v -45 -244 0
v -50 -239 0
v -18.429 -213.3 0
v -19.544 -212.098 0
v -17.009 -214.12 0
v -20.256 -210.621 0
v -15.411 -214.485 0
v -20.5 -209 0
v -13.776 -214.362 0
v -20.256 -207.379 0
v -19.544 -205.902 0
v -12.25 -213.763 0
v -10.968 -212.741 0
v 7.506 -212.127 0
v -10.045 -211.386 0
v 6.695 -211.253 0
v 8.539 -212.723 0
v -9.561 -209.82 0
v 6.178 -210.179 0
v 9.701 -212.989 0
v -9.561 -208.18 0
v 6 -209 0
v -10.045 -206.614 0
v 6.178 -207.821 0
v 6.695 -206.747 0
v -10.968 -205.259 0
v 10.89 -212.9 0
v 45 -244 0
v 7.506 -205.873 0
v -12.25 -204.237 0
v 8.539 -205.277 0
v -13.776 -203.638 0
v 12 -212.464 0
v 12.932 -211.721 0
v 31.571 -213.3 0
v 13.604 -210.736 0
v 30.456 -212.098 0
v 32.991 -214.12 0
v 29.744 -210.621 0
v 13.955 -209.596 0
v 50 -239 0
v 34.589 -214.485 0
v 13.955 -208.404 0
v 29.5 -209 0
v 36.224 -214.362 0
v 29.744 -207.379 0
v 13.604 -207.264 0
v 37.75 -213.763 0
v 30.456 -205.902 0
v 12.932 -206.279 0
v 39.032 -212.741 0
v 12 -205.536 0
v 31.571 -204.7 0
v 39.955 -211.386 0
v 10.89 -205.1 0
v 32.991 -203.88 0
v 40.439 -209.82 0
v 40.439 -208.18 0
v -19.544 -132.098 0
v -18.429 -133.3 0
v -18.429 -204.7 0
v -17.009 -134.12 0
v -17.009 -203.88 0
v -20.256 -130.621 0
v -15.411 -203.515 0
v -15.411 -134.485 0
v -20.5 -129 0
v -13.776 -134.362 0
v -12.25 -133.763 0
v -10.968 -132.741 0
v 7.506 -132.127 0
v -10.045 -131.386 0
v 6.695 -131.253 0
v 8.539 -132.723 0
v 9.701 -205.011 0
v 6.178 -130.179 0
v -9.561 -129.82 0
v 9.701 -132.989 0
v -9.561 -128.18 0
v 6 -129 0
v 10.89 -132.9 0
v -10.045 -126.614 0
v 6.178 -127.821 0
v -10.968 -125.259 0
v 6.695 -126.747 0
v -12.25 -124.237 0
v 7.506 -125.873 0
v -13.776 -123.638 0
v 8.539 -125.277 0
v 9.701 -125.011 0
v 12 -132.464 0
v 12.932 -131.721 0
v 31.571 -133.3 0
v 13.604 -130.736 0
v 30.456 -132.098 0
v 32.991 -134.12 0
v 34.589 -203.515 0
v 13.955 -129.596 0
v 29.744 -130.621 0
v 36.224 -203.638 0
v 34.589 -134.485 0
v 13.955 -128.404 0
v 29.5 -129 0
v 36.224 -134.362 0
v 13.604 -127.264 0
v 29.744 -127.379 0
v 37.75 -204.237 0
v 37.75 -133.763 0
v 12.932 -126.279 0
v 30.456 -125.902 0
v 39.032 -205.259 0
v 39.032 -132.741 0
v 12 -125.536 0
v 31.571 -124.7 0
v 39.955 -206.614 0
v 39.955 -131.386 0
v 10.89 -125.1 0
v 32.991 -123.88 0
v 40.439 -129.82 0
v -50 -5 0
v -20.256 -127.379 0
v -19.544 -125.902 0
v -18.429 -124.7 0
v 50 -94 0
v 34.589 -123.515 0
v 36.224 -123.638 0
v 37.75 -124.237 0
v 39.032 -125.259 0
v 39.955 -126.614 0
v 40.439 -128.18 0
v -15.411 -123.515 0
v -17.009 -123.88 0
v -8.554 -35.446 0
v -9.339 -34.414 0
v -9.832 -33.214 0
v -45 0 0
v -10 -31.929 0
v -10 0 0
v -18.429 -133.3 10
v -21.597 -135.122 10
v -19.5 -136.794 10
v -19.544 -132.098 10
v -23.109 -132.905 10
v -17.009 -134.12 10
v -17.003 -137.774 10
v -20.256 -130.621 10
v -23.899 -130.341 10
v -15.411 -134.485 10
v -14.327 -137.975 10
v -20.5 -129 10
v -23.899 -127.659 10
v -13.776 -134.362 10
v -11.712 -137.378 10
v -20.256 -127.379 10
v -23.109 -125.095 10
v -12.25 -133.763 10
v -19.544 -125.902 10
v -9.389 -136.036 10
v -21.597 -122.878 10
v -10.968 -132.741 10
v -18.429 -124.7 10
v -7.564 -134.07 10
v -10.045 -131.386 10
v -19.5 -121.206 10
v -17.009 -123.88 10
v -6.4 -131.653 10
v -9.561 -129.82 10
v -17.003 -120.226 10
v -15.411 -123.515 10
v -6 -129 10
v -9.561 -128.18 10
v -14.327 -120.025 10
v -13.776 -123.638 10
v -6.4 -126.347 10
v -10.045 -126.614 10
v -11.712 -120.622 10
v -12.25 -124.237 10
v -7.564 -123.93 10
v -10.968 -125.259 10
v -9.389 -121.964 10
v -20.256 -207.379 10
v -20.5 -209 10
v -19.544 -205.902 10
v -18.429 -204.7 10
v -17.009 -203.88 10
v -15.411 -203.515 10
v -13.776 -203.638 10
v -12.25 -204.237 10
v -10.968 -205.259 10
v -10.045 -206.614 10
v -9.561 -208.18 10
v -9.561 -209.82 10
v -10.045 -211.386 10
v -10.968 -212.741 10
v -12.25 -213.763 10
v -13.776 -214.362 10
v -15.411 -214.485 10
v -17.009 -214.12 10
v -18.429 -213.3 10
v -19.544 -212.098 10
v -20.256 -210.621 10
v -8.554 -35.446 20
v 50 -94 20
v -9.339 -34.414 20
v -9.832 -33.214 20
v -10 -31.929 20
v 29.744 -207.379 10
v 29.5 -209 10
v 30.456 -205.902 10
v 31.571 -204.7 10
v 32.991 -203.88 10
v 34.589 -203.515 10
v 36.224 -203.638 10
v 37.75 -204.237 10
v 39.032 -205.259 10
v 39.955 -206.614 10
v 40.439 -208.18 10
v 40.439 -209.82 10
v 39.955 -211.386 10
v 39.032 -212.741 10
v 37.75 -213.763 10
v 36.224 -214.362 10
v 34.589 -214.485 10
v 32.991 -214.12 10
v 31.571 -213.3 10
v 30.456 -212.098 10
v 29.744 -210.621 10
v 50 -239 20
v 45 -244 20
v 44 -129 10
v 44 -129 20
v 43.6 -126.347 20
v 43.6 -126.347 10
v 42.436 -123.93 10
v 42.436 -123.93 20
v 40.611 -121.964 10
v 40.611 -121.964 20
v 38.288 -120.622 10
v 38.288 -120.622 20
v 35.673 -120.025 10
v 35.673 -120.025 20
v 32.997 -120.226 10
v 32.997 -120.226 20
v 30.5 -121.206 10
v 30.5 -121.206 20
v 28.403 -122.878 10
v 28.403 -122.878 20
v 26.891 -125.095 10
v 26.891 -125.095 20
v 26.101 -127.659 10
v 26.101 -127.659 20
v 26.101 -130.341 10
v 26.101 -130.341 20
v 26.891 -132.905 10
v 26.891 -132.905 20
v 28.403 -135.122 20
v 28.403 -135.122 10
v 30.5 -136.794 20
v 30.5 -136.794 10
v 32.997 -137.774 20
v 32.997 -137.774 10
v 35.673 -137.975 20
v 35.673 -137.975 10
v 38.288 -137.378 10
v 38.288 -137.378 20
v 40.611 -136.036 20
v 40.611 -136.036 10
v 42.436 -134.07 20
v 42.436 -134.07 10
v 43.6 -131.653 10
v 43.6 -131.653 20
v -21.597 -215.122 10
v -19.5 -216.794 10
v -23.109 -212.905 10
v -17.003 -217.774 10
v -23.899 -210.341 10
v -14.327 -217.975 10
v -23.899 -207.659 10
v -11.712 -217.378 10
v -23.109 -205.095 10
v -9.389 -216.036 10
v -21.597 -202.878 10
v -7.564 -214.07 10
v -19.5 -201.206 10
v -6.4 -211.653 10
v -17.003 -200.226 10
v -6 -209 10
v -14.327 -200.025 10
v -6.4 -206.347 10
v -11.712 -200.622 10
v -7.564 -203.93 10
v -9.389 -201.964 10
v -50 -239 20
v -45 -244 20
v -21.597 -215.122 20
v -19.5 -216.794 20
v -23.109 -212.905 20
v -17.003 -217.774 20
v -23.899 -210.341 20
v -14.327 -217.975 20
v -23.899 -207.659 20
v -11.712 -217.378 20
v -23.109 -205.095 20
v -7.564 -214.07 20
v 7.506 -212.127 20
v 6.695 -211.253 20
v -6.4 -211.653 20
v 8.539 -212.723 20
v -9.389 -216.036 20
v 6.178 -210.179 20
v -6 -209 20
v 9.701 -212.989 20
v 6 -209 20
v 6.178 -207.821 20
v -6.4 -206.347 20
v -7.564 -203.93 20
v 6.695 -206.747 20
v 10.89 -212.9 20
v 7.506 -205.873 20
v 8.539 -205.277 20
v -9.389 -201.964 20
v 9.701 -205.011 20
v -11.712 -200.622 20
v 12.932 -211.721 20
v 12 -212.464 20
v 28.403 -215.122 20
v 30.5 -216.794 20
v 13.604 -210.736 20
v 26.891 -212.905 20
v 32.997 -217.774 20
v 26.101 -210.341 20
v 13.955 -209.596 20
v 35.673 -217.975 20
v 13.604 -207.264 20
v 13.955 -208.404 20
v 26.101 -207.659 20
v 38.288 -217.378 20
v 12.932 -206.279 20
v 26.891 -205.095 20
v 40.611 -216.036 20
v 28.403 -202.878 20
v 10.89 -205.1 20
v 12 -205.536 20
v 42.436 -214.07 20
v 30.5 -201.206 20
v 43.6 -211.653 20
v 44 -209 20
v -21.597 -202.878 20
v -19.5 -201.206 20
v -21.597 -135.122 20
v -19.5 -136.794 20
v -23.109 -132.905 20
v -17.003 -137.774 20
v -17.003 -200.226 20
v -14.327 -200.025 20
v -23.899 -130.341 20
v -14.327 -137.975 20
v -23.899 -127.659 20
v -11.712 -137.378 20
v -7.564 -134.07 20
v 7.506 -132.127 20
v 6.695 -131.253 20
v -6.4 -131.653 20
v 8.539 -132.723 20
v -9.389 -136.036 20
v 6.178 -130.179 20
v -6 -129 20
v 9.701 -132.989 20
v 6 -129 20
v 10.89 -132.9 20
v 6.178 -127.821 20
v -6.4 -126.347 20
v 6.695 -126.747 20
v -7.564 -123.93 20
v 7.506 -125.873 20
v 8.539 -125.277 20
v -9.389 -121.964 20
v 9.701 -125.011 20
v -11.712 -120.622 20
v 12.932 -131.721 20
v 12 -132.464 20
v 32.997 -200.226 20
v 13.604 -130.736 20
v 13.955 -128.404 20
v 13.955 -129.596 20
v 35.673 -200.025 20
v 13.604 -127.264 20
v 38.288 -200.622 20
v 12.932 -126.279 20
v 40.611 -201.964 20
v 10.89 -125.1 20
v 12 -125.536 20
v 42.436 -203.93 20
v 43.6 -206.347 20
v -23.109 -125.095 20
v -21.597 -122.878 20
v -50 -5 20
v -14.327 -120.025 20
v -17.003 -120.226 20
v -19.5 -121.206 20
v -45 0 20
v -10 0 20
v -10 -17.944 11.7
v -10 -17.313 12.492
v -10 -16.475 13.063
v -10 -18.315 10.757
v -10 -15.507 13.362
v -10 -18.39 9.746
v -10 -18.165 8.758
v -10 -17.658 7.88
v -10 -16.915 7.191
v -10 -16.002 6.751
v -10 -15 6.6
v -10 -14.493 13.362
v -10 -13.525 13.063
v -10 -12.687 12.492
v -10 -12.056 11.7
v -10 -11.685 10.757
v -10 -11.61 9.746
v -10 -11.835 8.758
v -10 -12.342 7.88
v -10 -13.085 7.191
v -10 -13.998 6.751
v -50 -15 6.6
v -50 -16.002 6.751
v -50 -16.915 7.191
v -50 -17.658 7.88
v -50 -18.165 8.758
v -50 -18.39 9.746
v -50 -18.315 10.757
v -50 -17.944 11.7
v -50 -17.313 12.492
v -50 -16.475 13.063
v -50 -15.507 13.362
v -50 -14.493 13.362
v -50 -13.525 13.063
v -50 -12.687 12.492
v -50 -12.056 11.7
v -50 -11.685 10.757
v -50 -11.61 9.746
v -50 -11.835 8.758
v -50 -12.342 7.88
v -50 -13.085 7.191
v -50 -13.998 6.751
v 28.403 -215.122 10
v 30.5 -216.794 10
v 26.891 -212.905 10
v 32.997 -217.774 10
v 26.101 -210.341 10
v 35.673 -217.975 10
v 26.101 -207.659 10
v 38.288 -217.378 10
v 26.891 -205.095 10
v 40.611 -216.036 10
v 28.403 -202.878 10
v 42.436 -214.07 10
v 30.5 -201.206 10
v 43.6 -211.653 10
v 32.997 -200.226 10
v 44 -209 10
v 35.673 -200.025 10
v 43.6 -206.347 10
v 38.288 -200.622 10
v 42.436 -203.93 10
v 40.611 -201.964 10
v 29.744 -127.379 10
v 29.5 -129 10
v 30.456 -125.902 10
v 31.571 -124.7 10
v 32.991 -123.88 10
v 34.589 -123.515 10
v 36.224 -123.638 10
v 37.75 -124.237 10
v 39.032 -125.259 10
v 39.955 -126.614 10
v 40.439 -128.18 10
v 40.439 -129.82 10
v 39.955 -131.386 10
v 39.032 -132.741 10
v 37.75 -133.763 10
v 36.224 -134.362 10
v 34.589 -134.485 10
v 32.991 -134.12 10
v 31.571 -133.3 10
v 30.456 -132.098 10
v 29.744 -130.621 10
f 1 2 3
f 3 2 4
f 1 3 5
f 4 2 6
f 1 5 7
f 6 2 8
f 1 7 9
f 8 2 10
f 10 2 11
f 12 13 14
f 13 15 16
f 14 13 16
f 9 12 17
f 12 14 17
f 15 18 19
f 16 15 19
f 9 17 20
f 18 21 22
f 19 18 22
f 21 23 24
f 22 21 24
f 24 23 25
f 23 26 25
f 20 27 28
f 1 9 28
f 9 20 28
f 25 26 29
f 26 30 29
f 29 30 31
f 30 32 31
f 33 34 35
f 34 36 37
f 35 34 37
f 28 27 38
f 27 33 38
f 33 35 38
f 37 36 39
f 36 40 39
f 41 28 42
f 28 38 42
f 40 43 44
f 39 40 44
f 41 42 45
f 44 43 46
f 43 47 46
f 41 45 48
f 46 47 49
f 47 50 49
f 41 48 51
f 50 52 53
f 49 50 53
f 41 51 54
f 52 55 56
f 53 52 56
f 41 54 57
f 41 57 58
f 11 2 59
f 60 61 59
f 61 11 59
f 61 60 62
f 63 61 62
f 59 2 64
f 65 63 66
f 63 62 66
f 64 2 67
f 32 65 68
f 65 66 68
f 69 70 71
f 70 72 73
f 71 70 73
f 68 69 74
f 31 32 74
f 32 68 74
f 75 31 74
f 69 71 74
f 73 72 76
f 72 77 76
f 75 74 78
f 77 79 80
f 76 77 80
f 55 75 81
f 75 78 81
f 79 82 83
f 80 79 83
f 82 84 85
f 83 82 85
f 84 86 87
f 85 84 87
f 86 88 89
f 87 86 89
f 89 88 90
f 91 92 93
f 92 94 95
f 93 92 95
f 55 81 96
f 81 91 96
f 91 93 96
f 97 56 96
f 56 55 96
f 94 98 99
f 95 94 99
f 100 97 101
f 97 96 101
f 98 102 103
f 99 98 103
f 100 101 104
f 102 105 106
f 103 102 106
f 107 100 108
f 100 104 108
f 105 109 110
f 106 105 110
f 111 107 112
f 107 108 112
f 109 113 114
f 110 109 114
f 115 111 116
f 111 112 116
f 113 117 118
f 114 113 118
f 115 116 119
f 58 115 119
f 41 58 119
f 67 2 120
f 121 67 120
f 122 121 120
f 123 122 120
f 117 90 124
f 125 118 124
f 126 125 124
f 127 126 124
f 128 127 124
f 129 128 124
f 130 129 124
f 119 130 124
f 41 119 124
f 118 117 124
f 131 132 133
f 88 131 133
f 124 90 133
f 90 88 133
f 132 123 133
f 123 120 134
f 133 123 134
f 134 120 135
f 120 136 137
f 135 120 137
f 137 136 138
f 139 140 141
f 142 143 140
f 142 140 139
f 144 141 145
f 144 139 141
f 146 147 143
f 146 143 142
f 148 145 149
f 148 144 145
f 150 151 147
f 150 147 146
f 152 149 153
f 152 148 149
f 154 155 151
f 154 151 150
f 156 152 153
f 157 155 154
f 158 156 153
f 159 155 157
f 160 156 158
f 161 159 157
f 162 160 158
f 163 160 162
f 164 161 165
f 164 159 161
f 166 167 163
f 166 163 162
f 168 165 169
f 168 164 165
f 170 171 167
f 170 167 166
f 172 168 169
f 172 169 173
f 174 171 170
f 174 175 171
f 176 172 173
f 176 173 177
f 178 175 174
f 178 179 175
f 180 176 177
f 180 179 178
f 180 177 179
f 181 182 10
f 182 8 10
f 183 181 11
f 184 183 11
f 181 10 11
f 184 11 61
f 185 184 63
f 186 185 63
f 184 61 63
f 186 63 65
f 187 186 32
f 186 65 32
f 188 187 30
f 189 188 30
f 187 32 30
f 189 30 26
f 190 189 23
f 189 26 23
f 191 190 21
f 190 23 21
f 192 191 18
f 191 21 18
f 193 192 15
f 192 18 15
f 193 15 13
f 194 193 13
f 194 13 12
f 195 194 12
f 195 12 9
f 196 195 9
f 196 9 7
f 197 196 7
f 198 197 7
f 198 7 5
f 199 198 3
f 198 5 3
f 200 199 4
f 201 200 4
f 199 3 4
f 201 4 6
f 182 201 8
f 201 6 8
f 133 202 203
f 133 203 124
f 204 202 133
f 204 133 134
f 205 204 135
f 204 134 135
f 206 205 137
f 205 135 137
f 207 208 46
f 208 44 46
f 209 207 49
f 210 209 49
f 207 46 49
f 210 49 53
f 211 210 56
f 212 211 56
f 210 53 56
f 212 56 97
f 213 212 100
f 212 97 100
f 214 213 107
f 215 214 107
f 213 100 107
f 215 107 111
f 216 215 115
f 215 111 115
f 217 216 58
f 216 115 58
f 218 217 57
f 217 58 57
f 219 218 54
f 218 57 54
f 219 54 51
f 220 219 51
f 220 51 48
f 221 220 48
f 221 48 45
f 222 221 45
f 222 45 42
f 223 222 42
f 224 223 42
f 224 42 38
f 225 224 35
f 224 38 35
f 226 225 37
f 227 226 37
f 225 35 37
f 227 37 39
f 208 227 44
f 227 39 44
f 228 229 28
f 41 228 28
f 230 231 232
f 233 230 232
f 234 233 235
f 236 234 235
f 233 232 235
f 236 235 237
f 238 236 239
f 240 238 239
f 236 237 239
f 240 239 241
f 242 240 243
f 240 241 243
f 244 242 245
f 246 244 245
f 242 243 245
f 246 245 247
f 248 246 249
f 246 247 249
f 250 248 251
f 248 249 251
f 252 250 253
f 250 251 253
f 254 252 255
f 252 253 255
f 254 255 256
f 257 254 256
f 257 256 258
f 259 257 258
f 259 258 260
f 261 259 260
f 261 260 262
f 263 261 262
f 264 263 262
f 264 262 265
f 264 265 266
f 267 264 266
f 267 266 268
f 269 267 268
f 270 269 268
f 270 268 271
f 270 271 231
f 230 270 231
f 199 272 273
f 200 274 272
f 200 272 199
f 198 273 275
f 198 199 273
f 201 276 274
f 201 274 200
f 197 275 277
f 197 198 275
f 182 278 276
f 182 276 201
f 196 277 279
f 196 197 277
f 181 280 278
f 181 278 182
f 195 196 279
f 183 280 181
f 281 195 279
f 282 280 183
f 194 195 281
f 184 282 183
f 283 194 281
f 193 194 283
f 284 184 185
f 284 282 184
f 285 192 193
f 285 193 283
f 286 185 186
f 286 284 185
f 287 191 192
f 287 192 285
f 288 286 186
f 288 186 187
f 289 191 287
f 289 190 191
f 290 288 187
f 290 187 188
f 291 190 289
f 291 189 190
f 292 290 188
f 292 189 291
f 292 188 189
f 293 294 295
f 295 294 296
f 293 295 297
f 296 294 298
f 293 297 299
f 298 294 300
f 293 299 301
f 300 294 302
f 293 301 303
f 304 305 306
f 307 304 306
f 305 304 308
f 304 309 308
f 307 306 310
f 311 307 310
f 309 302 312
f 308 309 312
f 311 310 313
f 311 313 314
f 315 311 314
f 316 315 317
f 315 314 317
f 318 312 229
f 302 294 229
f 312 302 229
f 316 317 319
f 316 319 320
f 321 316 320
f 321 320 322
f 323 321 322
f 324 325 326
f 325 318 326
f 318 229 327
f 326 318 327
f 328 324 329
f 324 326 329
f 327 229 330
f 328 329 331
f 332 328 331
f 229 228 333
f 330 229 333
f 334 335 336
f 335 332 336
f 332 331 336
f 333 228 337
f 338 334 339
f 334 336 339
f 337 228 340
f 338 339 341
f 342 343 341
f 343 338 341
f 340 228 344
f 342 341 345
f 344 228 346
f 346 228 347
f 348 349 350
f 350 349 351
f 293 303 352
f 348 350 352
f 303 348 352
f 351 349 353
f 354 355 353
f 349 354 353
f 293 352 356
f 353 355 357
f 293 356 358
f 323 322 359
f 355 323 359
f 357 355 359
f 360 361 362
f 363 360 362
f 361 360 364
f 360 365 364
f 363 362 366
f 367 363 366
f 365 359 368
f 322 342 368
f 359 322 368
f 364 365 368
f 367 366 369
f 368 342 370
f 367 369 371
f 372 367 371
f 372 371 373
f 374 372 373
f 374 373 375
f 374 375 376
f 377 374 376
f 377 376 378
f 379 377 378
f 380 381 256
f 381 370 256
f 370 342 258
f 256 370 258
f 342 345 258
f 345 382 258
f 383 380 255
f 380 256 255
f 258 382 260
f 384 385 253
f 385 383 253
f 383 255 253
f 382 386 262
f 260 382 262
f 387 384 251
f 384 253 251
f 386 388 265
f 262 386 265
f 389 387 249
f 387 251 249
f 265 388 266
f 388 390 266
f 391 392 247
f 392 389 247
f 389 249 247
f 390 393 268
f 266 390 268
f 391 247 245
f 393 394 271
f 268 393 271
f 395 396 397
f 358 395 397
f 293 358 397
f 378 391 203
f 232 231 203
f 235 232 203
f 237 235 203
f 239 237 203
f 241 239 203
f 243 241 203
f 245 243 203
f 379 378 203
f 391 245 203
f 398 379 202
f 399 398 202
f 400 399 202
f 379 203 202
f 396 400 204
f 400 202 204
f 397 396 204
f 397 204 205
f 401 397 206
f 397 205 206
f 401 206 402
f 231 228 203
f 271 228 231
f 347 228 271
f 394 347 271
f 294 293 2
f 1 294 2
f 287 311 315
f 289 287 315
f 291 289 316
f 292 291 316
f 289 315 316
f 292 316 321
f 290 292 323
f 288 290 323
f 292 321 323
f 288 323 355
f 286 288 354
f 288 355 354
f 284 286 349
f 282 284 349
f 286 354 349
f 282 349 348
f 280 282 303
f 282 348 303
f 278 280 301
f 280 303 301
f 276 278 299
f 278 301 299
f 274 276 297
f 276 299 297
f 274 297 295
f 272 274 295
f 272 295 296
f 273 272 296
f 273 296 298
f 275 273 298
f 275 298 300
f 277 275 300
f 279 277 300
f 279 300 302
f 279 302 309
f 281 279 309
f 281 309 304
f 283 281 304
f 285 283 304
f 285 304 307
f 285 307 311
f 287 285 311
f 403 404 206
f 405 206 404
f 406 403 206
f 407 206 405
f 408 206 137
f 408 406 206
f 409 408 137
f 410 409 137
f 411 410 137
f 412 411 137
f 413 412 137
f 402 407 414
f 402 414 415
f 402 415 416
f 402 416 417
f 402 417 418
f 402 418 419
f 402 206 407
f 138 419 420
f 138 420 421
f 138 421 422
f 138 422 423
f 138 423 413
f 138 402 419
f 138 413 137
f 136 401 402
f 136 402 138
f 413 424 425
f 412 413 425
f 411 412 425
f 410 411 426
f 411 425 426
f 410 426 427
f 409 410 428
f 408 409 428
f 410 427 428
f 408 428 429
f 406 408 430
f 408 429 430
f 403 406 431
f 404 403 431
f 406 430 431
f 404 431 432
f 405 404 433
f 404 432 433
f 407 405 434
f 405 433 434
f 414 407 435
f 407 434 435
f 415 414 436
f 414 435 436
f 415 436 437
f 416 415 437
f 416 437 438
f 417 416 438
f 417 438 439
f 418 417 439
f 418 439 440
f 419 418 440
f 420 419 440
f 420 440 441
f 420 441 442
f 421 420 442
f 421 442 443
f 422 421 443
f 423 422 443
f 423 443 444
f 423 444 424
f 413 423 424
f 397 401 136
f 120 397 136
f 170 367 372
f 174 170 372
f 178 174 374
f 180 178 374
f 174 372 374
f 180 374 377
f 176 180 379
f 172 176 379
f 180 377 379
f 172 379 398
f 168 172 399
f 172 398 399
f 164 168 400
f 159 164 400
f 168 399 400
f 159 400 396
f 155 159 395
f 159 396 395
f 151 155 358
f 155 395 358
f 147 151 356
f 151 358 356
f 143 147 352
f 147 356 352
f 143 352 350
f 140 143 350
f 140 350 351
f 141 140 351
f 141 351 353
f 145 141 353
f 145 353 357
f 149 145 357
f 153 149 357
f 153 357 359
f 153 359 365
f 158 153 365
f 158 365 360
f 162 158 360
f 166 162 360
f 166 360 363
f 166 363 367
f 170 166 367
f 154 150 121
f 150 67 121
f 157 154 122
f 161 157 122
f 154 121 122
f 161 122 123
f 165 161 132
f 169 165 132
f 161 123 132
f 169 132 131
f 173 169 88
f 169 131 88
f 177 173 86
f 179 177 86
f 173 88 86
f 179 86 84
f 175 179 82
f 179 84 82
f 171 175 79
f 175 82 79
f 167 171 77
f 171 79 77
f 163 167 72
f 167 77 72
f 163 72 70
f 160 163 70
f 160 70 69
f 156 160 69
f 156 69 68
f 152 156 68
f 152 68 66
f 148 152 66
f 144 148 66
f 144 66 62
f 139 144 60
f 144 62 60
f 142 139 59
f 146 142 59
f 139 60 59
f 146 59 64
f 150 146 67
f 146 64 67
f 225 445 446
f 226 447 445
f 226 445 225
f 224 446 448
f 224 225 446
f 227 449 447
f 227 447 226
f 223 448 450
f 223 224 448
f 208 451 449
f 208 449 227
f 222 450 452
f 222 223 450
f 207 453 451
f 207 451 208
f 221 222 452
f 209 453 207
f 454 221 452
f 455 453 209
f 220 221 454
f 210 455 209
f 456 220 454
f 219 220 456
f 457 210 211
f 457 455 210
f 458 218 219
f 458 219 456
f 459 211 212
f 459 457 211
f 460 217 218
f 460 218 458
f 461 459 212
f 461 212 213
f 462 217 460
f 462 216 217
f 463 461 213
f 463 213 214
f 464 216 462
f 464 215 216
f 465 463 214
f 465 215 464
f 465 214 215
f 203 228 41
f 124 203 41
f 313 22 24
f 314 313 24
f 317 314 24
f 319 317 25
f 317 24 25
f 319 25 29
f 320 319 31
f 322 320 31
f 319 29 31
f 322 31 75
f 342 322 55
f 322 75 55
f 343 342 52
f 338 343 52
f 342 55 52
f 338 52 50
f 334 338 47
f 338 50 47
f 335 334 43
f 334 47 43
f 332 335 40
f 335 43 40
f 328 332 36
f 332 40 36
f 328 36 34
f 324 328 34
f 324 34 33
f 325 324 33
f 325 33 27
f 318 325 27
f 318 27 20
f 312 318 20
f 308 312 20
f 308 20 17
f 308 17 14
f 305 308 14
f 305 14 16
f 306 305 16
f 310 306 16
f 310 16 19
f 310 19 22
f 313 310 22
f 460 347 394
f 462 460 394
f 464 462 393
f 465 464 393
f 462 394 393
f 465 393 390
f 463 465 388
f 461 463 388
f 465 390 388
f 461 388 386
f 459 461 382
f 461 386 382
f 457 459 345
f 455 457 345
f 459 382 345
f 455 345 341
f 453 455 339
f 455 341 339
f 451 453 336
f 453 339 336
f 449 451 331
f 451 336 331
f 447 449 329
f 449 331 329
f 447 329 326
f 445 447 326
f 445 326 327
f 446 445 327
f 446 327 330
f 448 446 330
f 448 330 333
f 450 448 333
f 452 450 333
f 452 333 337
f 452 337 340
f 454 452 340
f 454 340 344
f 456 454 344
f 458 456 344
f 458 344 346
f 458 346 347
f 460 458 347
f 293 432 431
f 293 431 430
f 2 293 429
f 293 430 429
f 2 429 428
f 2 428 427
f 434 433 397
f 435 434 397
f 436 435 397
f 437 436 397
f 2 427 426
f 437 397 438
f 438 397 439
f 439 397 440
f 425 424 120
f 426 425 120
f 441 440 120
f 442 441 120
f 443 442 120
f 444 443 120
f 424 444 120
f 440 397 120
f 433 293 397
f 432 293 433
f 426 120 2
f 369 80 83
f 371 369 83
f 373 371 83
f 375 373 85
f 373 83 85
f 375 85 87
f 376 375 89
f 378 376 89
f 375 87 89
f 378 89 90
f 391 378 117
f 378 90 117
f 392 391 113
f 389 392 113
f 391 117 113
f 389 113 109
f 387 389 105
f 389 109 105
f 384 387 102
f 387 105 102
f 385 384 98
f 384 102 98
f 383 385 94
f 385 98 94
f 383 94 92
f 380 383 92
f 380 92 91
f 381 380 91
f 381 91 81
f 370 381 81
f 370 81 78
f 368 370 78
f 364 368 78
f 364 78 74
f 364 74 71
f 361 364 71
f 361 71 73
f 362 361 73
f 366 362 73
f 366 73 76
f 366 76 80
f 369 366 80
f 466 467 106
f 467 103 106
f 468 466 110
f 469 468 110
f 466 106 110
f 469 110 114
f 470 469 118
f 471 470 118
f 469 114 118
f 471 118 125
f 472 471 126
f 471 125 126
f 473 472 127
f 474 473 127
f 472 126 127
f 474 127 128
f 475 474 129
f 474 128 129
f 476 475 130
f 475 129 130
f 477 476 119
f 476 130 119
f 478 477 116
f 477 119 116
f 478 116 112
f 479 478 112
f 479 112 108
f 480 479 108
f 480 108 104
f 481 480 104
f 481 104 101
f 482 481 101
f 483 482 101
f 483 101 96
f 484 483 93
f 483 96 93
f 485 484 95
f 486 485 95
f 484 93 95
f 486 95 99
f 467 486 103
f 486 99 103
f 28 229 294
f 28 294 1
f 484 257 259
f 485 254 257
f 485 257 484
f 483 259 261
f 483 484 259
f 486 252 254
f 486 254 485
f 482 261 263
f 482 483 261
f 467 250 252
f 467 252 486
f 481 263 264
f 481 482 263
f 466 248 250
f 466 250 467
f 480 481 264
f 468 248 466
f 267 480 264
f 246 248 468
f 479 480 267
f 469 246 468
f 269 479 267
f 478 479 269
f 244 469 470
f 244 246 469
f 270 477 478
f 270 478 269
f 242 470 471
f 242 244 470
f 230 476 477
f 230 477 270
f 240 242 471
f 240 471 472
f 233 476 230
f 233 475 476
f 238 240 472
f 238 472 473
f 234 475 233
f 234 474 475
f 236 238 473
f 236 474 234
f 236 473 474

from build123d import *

# Parameters (mm, degrees)
SKETCH_3_W                    = 20
SKETCH_3_H                    = 244
EXTRUDE_1_DEPTH               = 50
SKETCH_4_W                    = 60
SKETCH_4_H                    = 20
CUT_EXTRUDE_1_DEPTH           = 34
HOLE_WIZARD_M8_1_D            = 6.8
CHAMFER_1_SIZE                = 60
CHAMFER_2_SIZE                = 5
HOLE_WIZARD_M10_1_D           = 11
HOLE_WIZARD_M10_1_CBORE_D     = 18
HOLE_WIZARD_M10_1_CBORE_DEPTH = 10
HOLE_WIZARD_8_0_8_1_D         = 8
FILLET_1_DEPTH                = 20


with BuildPart() as part:
    # 草圖3 → 伸長1 (new, symmetric)
    with BuildSketch(Plane(origin=(0, 0, 0), x_dir=(0, 0, -1), z_dir=(1, 0, 0))):
        with Locations((-10, -122)):
            Rectangle(SKETCH_3_W, SKETCH_3_H)
    extrude(amount=EXTRUDE_1_DEPTH, both=True)

    # 草圖4 → 除料-伸長1 (cut)
    with BuildSketch(Plane(origin=(0, 0, 0), x_dir=(1, 0, 0), z_dir=(0, 1, 0))):
        with Locations((20, -10)):
            Rectangle(SKETCH_4_W, SKETCH_4_H)
    extrude(amount=-CUT_EXTRUDE_1_DEPTH, mode=Mode.SUBTRACT)

    # M8 螺紋孔1 (through all)
    with Locations(Plane(origin=(-10, -84.062632567, -21.444178573), x_dir=(0, 0, 1), z_dir=(1, 0, 0))):
        with Locations((31.444178573, -69.062632567)):
            Hole(HOLE_WIZARD_M8_1_D / 2)

    # 導角1
    chamfer_1_edges = [part.edges().sort_by_distance(p)[0] for p in [
        (50, -34, 10),
    ]]
    chamfer(chamfer_1_edges, length=CHAMFER_1_SIZE - 0.0001)  # a hair under: the kernel refuses the full size

    # 導角2
    chamfer_2_edges = [part.edges().sort_by_distance(p)[0] for p in [
        (-50, 0, 10),
        (-50, -244, 10),
        (50, -244, 10),
    ]]
    chamfer(chamfer_2_edges, length=CHAMFER_2_SIZE)

    # M10 六角承窩頭蓋螺釘的柱孔1 (through all)
    with Locations(Plane.XY.offset(20)):
        with Locations((-15, -129), (35, -129), (-15, -209), (35, -209)):
            CounterBoreHole(HOLE_WIZARD_M10_1_D / 2, HOLE_WIZARD_M10_1_CBORE_D / 2, HOLE_WIZARD_M10_1_CBORE_DEPTH)

    # Ø8.0 (8) 直徑孔1 (through all)
    with Locations(Plane.XY.offset(20)):
        with Locations((10, -129), (10, -209)):
            Hole(HOLE_WIZARD_8_0_8_1_D / 2)

    # 圓角1: read off the stored shape, not the designer's step
    # 圓角1 outline → 圓角1 (add)
    with BuildSketch(Plane.XY):
        with BuildLine():
            ThreePointArc((-8.535533906, -35.464466094), (-9.619397663, -33.84234935), (-10, -31.928932188))
            Line((-10, -31.928932188), (-10, -34))
            Line((-10, -34), (-8.535533906, -35.464466094))
        make_face()
    extrude(amount=FILLET_1_DEPTH)


solid = part.part
